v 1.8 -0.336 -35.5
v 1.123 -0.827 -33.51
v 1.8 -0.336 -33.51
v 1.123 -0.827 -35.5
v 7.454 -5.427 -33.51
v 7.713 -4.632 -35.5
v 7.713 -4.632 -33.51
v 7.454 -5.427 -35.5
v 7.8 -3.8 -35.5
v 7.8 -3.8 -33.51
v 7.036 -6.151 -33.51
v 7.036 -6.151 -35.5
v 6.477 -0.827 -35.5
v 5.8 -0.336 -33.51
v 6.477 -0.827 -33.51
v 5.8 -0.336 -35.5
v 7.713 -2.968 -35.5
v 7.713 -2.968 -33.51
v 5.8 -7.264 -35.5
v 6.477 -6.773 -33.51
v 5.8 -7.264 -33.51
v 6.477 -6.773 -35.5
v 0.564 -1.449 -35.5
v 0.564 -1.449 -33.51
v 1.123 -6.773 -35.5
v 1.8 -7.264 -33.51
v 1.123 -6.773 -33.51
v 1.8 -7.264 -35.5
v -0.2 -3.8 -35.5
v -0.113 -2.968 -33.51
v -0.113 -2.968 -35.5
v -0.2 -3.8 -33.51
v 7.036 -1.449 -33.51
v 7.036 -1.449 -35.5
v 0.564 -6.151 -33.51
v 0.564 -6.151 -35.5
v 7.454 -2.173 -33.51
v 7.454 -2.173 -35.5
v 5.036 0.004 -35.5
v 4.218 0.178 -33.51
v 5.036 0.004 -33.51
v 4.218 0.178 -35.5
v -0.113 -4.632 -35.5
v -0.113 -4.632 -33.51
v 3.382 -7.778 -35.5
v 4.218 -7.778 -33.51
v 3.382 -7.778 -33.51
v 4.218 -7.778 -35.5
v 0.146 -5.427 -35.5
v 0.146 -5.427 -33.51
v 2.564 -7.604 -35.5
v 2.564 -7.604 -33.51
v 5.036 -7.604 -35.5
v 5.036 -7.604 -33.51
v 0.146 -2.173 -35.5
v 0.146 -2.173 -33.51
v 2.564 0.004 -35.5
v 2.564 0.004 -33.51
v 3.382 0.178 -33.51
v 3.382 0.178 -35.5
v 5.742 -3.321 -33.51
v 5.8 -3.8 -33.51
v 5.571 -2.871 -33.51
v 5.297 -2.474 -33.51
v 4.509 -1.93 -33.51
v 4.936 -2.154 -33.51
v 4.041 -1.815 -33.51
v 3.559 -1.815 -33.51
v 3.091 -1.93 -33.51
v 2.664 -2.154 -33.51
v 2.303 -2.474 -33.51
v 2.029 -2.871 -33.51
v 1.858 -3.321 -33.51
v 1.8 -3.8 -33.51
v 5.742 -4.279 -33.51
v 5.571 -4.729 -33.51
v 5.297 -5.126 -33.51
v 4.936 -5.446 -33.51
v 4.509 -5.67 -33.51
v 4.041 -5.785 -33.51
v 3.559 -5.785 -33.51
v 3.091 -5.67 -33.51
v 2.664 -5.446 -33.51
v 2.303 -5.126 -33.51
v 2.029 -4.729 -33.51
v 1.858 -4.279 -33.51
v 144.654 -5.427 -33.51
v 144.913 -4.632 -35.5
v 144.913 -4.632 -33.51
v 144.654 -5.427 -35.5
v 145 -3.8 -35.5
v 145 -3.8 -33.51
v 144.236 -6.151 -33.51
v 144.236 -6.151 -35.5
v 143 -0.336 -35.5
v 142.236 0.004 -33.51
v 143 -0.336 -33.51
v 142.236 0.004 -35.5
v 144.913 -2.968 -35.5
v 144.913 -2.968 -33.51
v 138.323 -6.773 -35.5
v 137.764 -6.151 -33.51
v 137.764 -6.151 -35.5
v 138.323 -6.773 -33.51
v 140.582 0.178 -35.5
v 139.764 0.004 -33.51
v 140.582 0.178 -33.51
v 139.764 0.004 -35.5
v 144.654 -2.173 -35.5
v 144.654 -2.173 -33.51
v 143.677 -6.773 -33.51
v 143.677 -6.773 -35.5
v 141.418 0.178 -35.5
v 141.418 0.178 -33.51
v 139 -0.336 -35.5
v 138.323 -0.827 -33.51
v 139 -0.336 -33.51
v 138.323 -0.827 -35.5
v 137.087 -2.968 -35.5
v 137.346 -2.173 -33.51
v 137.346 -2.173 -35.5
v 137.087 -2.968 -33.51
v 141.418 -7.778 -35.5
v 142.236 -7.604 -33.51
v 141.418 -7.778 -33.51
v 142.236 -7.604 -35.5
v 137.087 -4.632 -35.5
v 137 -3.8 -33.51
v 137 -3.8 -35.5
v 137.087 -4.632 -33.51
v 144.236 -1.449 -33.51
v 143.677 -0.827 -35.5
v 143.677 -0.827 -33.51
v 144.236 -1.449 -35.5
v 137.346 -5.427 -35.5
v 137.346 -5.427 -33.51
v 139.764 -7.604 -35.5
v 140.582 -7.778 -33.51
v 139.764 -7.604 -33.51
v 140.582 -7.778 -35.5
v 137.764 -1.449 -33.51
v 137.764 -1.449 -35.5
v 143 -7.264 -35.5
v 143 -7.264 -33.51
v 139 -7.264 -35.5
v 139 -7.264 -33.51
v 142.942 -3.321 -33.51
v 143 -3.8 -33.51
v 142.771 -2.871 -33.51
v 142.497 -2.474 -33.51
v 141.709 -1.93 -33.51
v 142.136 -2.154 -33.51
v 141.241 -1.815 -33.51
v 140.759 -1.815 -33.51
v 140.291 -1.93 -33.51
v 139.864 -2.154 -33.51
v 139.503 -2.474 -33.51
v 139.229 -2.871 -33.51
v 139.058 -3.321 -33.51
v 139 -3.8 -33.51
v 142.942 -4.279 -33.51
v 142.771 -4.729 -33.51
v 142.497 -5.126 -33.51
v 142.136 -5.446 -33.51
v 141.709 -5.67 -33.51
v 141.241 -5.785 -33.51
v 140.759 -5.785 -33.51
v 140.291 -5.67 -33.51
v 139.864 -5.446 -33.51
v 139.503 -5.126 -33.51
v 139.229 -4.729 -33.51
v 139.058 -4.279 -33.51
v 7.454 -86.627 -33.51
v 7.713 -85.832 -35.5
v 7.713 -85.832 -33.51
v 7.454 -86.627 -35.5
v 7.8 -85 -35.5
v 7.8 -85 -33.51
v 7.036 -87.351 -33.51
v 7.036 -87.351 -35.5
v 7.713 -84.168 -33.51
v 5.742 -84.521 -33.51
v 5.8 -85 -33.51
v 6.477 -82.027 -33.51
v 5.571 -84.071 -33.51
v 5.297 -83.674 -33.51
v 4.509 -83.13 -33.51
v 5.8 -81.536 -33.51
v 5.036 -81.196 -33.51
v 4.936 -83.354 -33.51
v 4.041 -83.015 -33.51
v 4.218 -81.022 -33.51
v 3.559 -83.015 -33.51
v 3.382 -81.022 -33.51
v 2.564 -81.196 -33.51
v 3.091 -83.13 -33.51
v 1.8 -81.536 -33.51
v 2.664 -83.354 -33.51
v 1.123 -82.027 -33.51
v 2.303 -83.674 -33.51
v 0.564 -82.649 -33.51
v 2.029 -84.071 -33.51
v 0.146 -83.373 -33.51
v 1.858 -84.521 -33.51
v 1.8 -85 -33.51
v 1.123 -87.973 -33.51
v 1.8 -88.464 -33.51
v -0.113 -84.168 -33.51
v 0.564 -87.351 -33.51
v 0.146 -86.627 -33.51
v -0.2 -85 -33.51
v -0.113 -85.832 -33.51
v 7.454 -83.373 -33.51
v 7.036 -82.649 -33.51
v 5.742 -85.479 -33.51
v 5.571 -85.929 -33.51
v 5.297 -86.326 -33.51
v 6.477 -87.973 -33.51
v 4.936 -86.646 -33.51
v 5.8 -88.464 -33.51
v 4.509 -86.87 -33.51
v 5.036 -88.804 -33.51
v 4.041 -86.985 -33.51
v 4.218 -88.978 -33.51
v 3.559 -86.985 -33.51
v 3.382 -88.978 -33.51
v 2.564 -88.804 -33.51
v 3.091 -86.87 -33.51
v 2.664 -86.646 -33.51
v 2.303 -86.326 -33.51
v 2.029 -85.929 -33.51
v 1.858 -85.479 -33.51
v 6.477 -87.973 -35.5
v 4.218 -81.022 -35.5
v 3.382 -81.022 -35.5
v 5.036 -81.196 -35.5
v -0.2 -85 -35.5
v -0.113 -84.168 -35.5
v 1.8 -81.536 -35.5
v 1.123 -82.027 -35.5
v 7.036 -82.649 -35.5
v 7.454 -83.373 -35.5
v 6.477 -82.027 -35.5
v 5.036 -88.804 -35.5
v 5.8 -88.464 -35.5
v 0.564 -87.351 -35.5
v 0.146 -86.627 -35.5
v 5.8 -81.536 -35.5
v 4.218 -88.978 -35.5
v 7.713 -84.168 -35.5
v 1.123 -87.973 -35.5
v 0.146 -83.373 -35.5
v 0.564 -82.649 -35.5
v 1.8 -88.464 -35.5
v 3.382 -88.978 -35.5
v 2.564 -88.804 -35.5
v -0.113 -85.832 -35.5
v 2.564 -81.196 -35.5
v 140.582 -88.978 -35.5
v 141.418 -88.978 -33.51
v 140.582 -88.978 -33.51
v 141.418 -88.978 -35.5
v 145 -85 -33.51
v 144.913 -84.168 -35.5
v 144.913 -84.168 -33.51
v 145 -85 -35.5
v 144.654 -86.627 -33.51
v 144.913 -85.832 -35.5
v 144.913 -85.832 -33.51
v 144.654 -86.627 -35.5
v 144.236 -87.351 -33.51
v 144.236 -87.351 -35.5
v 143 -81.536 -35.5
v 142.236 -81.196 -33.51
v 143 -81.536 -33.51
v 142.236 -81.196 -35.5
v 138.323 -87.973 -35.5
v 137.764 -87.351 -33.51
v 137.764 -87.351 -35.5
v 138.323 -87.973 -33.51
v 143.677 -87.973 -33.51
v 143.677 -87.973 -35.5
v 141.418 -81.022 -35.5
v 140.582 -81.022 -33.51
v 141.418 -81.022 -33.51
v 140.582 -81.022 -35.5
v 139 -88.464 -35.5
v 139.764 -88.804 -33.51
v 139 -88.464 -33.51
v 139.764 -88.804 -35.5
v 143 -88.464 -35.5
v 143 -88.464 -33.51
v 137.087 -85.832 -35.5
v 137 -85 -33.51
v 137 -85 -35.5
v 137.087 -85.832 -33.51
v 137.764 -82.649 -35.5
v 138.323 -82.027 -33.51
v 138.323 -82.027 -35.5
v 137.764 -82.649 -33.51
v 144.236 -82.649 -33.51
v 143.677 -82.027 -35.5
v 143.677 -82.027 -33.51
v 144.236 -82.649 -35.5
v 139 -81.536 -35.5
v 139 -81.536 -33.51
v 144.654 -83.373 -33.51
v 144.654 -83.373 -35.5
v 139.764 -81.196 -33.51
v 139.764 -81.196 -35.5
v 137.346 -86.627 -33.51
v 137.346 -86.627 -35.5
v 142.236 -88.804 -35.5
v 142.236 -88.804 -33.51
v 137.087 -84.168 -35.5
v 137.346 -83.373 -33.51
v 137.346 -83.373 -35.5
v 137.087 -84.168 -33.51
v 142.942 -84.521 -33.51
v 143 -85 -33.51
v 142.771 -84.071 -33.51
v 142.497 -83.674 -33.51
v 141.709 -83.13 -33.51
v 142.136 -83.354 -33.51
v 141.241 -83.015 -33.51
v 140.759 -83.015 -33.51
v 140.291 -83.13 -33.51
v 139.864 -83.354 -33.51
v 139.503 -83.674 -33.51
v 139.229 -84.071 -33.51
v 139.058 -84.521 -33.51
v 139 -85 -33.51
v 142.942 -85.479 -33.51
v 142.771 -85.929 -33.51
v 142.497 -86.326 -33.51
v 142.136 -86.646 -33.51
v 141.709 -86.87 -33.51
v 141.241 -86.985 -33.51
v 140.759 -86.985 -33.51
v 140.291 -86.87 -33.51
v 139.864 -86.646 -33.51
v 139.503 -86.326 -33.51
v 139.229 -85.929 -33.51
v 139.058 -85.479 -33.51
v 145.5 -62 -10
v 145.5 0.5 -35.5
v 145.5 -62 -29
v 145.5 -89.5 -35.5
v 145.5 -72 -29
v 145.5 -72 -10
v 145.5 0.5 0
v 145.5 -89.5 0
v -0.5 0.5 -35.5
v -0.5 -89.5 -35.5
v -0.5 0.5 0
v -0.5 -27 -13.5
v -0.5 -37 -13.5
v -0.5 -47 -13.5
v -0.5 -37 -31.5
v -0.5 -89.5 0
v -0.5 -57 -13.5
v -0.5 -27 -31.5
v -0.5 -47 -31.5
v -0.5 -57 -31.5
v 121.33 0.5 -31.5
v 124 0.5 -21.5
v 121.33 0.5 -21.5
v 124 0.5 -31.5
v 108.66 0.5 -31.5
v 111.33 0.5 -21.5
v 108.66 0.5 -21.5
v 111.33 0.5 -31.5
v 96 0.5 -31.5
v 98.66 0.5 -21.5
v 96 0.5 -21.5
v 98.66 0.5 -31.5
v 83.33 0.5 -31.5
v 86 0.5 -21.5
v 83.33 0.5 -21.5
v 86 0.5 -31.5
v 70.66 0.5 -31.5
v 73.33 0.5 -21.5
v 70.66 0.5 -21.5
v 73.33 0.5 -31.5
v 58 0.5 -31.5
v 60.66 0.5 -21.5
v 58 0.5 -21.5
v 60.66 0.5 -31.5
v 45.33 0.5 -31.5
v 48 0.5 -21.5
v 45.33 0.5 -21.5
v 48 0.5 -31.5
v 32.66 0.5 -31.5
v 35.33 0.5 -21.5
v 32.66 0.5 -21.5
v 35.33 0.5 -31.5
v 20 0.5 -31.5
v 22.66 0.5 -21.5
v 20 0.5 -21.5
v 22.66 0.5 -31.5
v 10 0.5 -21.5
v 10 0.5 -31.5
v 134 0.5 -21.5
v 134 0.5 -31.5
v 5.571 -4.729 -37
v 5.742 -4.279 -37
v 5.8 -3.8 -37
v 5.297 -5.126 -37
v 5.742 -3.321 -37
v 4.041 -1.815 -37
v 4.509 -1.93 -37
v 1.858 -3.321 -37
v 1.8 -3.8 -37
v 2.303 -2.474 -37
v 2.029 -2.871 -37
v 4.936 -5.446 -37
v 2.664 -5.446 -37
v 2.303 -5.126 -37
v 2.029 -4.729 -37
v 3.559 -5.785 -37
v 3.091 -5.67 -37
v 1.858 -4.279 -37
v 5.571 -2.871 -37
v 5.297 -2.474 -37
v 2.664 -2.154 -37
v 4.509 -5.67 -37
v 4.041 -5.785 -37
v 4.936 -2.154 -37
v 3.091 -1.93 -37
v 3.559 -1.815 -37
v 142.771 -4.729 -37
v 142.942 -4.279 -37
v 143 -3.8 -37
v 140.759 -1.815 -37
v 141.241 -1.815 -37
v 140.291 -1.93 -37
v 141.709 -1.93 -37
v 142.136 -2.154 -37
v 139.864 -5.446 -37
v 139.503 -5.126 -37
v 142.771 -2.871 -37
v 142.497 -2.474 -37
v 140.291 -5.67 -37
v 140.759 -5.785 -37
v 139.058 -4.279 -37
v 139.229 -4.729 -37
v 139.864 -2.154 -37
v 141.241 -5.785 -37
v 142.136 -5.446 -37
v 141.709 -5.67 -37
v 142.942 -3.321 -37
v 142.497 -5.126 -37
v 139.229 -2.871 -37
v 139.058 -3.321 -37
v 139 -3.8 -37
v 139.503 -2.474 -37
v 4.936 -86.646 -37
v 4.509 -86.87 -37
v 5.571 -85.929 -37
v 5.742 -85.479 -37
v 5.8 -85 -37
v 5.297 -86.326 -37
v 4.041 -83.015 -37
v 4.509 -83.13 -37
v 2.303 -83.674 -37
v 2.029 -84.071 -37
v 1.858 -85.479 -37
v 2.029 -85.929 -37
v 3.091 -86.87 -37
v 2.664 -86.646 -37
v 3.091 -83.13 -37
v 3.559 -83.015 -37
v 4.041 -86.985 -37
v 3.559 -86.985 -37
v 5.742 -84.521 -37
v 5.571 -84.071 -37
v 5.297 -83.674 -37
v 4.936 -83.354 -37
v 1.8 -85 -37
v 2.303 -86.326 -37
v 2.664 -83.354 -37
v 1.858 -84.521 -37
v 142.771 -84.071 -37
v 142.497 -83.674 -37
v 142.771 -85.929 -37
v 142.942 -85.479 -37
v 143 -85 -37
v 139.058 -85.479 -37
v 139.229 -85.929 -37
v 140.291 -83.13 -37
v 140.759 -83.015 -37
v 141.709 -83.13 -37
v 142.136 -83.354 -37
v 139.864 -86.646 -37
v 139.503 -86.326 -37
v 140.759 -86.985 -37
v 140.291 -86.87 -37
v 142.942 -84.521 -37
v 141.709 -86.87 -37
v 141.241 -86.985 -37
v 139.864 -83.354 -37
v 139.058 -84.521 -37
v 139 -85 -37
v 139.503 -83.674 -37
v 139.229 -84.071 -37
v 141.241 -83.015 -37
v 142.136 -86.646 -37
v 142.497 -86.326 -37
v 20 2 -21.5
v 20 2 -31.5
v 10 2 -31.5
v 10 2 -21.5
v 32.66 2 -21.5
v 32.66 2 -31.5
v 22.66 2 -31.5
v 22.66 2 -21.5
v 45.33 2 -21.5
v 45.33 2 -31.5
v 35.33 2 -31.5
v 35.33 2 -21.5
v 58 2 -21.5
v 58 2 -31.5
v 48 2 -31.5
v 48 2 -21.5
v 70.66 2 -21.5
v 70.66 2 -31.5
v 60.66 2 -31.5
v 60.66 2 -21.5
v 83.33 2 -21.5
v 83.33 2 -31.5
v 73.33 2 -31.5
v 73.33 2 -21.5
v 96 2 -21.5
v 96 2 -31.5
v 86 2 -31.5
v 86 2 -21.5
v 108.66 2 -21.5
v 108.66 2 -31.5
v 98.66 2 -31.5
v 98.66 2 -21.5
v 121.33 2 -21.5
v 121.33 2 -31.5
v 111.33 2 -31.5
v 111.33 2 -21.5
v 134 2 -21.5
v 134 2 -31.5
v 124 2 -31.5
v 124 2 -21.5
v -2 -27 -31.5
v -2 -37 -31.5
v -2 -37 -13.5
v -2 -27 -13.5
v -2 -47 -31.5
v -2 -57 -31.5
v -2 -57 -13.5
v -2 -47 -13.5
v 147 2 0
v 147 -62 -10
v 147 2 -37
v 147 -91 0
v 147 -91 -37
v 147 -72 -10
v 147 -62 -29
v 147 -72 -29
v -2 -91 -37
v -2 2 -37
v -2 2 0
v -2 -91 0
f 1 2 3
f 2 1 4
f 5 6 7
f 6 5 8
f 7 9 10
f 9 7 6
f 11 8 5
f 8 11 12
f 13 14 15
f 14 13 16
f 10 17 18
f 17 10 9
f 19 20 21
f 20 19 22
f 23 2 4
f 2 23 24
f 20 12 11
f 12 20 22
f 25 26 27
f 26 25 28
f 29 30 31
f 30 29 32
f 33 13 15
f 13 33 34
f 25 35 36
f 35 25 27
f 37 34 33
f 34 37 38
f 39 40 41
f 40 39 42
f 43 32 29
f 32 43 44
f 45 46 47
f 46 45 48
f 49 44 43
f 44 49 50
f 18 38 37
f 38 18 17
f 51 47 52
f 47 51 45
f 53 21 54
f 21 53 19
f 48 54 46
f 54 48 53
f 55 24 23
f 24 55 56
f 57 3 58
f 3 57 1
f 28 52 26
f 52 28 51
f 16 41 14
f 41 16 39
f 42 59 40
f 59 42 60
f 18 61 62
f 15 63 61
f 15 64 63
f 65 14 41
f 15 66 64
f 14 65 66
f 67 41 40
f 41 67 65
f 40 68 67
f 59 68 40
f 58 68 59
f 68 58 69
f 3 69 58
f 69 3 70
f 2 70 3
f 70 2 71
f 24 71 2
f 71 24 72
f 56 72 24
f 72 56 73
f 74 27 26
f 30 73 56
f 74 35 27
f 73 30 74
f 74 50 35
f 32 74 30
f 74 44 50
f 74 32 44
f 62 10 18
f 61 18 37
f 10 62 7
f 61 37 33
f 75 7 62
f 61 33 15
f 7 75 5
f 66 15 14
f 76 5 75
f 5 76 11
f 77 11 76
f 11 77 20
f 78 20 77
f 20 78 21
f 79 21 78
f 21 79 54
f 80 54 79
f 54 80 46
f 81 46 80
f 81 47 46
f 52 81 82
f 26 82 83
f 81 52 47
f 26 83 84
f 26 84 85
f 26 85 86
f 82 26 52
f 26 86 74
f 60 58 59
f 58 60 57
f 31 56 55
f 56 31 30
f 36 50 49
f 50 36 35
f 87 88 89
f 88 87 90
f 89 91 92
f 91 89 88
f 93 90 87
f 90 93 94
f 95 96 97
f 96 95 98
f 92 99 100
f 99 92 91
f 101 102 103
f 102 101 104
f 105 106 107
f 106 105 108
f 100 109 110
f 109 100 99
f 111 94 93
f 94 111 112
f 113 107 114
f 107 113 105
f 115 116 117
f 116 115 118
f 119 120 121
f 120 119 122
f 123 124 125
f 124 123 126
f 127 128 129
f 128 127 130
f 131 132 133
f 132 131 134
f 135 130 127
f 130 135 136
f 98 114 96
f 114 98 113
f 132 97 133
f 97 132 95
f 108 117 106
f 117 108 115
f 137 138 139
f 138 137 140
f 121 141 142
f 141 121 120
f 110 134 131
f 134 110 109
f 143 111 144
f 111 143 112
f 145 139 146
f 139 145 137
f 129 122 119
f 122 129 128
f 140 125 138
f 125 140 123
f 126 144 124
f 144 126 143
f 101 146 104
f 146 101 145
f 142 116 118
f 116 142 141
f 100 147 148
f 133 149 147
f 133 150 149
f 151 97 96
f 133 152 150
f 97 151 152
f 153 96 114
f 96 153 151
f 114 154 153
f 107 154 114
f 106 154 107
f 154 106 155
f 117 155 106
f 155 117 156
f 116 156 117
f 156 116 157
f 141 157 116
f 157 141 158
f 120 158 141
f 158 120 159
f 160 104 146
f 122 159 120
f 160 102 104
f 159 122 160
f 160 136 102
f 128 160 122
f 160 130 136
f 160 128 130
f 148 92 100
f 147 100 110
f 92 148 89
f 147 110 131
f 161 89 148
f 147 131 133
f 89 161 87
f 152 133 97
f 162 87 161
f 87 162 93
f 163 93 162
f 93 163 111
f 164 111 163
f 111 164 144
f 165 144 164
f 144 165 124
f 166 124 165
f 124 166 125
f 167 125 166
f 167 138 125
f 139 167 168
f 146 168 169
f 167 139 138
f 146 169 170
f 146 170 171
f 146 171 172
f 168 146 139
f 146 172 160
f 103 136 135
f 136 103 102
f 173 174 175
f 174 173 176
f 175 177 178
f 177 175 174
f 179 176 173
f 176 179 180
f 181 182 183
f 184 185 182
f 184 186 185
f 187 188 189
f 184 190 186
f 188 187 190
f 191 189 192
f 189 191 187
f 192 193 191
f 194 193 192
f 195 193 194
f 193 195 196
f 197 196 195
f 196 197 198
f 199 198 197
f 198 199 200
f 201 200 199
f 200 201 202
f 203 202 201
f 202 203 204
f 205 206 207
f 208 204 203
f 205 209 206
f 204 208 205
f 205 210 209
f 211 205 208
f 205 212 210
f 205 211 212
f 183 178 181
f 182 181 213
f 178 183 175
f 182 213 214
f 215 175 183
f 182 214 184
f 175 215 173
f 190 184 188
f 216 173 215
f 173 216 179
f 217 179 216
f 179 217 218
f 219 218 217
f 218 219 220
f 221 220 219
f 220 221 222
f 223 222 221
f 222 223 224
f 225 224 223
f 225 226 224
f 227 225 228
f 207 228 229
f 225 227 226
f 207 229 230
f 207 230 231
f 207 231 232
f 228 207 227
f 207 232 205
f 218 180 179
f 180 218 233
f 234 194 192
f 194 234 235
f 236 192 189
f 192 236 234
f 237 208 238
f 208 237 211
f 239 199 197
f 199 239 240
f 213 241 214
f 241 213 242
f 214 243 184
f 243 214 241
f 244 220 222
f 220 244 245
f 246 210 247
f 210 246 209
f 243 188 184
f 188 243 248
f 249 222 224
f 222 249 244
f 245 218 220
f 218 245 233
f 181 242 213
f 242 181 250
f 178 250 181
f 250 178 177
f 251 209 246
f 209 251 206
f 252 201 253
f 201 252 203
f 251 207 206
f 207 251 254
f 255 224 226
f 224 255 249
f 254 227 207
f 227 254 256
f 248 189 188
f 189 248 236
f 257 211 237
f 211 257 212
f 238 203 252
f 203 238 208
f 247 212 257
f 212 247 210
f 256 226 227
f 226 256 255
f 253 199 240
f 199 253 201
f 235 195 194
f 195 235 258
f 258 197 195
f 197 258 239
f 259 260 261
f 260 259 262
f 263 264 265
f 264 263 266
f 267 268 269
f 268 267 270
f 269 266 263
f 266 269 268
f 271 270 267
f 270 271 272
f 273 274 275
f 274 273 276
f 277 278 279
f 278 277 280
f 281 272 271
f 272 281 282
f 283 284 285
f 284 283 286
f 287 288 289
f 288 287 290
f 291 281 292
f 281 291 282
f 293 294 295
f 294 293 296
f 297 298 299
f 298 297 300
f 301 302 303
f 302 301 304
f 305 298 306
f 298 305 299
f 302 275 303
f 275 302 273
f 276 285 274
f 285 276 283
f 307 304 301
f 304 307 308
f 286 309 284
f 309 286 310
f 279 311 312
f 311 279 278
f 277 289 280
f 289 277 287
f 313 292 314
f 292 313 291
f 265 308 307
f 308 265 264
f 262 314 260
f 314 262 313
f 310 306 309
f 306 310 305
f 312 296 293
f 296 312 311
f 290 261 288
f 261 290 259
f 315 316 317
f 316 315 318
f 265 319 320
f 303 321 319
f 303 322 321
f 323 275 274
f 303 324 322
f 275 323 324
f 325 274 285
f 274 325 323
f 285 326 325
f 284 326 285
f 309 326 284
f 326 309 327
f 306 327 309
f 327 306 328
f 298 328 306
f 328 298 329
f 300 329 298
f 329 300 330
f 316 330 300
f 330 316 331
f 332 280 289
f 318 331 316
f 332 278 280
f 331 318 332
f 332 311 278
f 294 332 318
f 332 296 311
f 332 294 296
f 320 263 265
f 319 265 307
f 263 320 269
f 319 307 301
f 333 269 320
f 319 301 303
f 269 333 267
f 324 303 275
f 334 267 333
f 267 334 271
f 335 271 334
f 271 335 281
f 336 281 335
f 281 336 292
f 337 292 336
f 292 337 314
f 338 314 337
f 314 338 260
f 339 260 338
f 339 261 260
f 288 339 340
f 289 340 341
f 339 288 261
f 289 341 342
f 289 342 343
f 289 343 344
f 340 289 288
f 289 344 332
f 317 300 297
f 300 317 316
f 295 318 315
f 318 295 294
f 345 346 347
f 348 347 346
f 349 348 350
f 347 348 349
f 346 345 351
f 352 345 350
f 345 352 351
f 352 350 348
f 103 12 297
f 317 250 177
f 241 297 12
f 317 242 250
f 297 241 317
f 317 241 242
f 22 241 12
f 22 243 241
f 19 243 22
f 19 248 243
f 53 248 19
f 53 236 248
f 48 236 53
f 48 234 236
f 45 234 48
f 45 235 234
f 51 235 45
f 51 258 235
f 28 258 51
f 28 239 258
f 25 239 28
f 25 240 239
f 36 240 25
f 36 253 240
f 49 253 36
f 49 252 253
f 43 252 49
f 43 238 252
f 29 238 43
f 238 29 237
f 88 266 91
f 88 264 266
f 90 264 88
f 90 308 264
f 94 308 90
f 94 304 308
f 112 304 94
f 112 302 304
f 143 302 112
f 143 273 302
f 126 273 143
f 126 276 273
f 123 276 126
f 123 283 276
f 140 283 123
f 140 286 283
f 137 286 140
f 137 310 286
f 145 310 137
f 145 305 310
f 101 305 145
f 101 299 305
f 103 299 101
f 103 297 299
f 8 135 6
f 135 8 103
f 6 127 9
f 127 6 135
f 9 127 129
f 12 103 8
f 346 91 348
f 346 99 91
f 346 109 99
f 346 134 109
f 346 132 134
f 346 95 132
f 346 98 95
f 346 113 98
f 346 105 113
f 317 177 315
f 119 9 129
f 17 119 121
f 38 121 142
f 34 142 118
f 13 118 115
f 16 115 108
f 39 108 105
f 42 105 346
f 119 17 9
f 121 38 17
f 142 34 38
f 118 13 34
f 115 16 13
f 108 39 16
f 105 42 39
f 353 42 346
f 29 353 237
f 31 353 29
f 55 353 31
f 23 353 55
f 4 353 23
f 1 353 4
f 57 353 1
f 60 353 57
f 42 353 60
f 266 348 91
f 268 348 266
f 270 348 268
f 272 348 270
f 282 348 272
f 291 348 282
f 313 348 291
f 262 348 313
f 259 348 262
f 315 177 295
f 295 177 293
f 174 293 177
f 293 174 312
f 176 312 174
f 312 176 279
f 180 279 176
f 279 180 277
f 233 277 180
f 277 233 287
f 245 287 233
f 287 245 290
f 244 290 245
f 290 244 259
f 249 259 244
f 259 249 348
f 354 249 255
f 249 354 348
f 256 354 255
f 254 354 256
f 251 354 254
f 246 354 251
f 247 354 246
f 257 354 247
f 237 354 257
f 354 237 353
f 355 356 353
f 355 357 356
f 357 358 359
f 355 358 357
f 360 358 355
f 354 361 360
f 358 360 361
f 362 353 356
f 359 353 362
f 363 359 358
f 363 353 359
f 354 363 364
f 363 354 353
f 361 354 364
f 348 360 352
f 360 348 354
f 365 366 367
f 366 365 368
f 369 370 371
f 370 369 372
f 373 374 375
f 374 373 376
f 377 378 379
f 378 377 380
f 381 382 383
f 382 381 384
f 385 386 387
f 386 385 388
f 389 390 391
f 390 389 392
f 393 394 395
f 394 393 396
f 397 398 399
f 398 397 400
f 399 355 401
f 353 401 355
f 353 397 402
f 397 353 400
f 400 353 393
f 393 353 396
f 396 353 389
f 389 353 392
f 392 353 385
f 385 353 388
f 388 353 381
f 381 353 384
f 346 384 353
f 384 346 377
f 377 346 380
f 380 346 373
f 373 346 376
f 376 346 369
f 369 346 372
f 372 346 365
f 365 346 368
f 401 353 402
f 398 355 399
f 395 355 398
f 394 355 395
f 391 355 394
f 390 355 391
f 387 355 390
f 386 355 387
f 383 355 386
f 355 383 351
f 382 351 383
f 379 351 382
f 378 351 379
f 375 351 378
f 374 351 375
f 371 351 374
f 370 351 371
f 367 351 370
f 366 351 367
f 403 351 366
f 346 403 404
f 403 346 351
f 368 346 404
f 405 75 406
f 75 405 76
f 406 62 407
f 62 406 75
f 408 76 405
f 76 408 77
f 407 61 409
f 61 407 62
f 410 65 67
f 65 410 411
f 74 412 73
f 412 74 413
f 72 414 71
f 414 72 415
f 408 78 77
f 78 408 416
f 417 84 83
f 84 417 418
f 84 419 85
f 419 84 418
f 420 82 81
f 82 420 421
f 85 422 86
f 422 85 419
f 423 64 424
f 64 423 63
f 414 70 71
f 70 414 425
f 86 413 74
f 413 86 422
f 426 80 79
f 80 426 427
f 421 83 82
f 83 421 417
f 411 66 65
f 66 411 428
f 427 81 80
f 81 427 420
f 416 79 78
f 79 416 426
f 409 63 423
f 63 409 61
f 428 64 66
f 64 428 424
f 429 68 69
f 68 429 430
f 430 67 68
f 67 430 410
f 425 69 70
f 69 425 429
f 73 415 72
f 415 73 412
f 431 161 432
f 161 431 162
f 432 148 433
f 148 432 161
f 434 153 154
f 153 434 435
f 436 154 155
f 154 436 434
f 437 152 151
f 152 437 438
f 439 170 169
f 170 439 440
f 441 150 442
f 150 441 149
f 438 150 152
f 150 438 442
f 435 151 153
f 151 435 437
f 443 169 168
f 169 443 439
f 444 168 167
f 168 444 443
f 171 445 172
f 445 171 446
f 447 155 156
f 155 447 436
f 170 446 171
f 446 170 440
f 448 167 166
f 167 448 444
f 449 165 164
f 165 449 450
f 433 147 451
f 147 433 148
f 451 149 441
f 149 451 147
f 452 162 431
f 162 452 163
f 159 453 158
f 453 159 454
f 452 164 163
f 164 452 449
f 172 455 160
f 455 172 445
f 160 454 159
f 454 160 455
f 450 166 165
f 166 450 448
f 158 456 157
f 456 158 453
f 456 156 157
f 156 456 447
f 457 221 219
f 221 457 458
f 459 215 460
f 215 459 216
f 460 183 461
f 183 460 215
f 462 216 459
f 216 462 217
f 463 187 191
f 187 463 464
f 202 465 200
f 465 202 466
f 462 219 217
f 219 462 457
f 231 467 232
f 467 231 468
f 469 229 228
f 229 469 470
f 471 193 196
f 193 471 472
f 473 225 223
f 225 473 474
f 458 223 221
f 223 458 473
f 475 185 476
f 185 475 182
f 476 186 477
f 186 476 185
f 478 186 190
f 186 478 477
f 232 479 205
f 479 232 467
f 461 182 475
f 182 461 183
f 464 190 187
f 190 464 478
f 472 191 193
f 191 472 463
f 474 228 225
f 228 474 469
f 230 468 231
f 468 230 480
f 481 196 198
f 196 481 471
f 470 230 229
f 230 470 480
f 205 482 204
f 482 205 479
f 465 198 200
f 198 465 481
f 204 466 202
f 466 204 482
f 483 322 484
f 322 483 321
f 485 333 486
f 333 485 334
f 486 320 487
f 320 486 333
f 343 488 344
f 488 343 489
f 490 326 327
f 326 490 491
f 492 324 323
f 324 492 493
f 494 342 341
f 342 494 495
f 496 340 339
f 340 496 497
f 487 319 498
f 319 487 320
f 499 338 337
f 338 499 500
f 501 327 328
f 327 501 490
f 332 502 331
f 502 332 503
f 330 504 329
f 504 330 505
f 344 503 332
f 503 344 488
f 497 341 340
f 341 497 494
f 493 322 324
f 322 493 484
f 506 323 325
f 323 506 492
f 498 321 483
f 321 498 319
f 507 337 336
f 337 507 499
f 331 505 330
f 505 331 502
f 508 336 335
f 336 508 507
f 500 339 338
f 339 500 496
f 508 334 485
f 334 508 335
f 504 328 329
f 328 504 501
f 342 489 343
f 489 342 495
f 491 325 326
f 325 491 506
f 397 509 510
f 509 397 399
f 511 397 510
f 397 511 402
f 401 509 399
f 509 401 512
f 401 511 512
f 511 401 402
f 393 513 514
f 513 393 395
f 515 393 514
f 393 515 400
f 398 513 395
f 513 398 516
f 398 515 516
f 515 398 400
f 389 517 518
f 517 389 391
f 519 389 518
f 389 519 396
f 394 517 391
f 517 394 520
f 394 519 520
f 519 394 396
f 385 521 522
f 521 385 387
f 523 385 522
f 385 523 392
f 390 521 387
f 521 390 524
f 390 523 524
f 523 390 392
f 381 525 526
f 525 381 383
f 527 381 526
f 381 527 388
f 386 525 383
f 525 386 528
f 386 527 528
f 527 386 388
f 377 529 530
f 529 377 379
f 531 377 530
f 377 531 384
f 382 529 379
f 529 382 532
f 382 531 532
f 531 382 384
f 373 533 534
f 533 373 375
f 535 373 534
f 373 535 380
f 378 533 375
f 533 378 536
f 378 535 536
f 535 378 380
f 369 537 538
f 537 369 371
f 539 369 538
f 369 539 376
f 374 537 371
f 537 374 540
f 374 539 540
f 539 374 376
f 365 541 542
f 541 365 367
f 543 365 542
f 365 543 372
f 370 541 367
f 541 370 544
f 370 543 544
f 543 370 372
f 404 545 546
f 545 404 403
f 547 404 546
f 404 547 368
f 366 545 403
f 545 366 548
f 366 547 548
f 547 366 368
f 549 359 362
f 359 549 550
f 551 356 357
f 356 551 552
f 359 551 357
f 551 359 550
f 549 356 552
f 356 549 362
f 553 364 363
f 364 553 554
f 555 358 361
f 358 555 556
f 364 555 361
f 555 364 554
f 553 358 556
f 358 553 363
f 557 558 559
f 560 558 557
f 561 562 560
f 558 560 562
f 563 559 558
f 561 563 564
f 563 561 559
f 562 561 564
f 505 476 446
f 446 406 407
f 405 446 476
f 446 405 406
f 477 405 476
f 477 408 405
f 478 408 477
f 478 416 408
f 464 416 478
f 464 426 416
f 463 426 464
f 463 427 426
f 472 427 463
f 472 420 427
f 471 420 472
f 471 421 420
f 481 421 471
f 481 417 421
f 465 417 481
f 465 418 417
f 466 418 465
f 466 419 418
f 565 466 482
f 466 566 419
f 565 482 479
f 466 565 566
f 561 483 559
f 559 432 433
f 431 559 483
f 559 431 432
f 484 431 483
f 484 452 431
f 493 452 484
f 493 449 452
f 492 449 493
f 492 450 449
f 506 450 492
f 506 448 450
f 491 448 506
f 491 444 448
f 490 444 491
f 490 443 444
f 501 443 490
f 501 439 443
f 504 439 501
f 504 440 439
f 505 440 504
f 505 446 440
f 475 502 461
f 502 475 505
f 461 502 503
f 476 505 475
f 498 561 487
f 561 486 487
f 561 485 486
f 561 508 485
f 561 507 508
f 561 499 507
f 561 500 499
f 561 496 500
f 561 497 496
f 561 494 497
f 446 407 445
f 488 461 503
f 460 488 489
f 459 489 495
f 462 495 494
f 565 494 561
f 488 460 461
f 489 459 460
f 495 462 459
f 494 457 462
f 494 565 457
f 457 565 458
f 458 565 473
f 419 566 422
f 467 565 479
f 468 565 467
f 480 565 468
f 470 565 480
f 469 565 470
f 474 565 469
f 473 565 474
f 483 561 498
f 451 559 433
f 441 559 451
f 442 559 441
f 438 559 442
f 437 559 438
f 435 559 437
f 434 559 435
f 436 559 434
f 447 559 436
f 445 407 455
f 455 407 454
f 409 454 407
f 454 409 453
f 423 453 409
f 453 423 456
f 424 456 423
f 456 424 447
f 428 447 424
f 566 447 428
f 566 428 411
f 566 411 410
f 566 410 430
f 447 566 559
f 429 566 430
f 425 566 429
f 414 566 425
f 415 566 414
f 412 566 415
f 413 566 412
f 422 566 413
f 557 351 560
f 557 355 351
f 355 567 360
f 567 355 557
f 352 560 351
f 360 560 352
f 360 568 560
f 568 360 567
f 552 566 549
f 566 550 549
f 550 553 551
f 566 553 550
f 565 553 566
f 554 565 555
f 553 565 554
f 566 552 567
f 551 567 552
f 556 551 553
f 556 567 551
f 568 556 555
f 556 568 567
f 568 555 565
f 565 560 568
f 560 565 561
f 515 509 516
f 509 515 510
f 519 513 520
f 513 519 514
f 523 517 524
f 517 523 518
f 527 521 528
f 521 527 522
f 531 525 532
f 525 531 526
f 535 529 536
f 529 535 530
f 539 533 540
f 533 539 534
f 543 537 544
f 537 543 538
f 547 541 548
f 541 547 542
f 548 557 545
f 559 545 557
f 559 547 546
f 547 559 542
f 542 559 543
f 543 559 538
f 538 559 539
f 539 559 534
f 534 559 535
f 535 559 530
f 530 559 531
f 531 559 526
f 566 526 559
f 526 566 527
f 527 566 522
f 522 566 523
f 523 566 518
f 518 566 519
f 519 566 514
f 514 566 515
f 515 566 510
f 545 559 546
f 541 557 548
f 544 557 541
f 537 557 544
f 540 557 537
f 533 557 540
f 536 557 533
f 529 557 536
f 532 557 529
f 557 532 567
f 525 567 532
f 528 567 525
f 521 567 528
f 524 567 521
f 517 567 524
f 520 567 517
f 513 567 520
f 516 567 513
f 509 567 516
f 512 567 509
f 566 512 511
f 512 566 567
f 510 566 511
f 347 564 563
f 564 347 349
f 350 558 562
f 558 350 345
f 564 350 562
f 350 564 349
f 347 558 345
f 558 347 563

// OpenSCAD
$fs=1/2;
part="Box";//[Front,Box,Buttons]
tolerance=0.5;
pcb_width=145;
pcb_height=89;
pcb_offset=26;
pcb_thickness=2;
solder_thickness=2;
pcb_holes=[[3.8,3.8],[141,3.8],[3.8,85],[141,85]];
walls=1.5;
buttons_pos=[[40,83],[70,83],[101,83]];
buttons_outer=10;
buttons_inner=4;
buttons_height=5;
connectors_top=[[15,8],[27.66,8],[40.33,8],[53,8],[65.66,8],[78.33,8],[91,8],[103.66,8],[116.33,8],[129,8]];
connectors_left=[[0,32],[0,52]];
connectors_right=[[144,67]];
switches_pos=[[11,77]];
switches_diameter=7;
screen_pos=[70,47];
screen_mount=[92,55];
mount_holes=4;
screen_rect=[92,40];

module front() {
difference() {
translate([-tolerance-walls,-tolerance-walls,0.01])cube([pcb_width+2*tolerance+2*walls,pcb_height+2*tolerance+2*walls,walls]);
for(tr=switches_pos) translate(tr) cylinder(d=switches_diameter,h=walls+0.02);
for (i=[[[1,0],[0,1]],[[-1,0],[0,1]],[[1,0],[0,-1]],[[-1,0],[0,-1]]])translate(screen_pos)translate(i*screen_mount/2)cylinder(d=mount_holes,h=walls+0.02);
translate(screen_pos-screen_rect/2)cube([screen_rect[0],screen_rect[1],walls+0.02]);
for(tr=buttons_pos) translate(tr) cylinder(d=buttons_inner+2*tolerance,h=pcb_offset-buttons_height-2+walls+0.02);
}
difference(){
translate([0,0,walls])cube([pcb_width,pcb_height,mount_holes/2]);
translate([walls,walls,walls-0.01])cube([pcb_width-2*walls,pcb_height-2*walls,mount_holes/2+0.02]);
}
difference() {
for (i=[[0,0,walls],[0,pcb_height-2*mount_holes,walls],[pcb_width-2*mount_holes,0,walls],[pcb_width-2*mount_holes,pcb_height-2*mount_holes,walls]]) translate(i) difference() {
  cube([2*mount_holes,2*mount_holes,2*mount_holes]);
  translate([-0.01,mount_holes,mount_holes])rotate([0,90,0])cylinder(h=2*mount_holes+0.02,d=mount_holes);}
}
difference() {
translate([0,0,walls])for (tr = buttons_pos) translate(tr) cylinder(d=buttons_outer,h=pcb_offset-buttons_height+pcb_thickness+solder_thickness-2);
translate([0,0,walls-0.01])for(tr=buttons_pos) translate(tr) cylinder(d=buttons_inner+2*tolerance,h=pcb_offset-buttons_height+pcb_thickness+solder_thickness+0.02);
}

difference() {
translate([0,0,walls]) for (i=[[[1,0],[0,1]],[[-1,0],[0,1]],[[1,0],[0,-1]],[[-1,0],[0,-1]]])translate(screen_pos)translate(i*screen_mount/2) cylinder(d=mount_holes*2,h=solder_thickness);
translate([0,0,walls-0.01])for (i=[[[1,0],[0,1]],[[-1,0],[0,1]],[[1,0],[0,-1]],[[-1,0],[0,-1]]])translate(screen_pos)translate(i*screen_mount/2) cylinder(d=mount_holes,h=solder_thickness+0.02);
}
}


module box() {
difference(){
translate([-tolerance-walls,-tolerance-walls,0])
cube([pcb_width+2*walls+2*tolerance,pcb_height+2*walls+2*tolerance,pcb_offset+2*pcb_thickness+2*solder_thickness+2*walls]);
difference() {
  translate([-tolerance,-tolerance,-0.01])cube([pcb_width+2*tolerance,pcb_height+2*tolerance,pcb_offset+2*pcb_thickness+2*solder_thickness+walls+0.01]);
  translate([0,0,pcb_offset+2*pcb_thickness+solder_thickness+walls+0.01])for (i=pcb_holes)translate(i)cylinder(d=mount_holes*2,h=solder_thickness);
}
translate([0,0,pcb_offset+2*pcb_thickness+solder_thickness+walls-0.01])for (i=pcb_holes)translate(i)cylinder(d=mount_holes,h=walls+solder_thickness+0.02);
for (i=connectors_top)translate(i)translate([0,-5,pcb_offset+pcb_thickness+solder_thickness+walls-5])cube([10,18,10],center=true);
for (i=connectors_left)translate(i)translate([0,0,pcb_offset+pcb_thickness+solder_thickness+walls-5-4])cube([20,10,18],center=true);
for (i=connectors_right)translate(i)translate([0,0,pcb_offset+pcb_thickness+solder_thickness+walls-5-7])cube([20,10,19],center=true);
}
}

module buttons() {
cylinder(d=buttons_outer,h=2);
translate([0,0,2])cylinder(d=buttons_inner,h=pcb_offset-buttons_height+pcb_thickness+solder_thickness+walls+2);
}

if (part=="Front") front(); 
if (part=="Box") rotate([180,0,0])box();
if (part=="Buttons") buttons();
